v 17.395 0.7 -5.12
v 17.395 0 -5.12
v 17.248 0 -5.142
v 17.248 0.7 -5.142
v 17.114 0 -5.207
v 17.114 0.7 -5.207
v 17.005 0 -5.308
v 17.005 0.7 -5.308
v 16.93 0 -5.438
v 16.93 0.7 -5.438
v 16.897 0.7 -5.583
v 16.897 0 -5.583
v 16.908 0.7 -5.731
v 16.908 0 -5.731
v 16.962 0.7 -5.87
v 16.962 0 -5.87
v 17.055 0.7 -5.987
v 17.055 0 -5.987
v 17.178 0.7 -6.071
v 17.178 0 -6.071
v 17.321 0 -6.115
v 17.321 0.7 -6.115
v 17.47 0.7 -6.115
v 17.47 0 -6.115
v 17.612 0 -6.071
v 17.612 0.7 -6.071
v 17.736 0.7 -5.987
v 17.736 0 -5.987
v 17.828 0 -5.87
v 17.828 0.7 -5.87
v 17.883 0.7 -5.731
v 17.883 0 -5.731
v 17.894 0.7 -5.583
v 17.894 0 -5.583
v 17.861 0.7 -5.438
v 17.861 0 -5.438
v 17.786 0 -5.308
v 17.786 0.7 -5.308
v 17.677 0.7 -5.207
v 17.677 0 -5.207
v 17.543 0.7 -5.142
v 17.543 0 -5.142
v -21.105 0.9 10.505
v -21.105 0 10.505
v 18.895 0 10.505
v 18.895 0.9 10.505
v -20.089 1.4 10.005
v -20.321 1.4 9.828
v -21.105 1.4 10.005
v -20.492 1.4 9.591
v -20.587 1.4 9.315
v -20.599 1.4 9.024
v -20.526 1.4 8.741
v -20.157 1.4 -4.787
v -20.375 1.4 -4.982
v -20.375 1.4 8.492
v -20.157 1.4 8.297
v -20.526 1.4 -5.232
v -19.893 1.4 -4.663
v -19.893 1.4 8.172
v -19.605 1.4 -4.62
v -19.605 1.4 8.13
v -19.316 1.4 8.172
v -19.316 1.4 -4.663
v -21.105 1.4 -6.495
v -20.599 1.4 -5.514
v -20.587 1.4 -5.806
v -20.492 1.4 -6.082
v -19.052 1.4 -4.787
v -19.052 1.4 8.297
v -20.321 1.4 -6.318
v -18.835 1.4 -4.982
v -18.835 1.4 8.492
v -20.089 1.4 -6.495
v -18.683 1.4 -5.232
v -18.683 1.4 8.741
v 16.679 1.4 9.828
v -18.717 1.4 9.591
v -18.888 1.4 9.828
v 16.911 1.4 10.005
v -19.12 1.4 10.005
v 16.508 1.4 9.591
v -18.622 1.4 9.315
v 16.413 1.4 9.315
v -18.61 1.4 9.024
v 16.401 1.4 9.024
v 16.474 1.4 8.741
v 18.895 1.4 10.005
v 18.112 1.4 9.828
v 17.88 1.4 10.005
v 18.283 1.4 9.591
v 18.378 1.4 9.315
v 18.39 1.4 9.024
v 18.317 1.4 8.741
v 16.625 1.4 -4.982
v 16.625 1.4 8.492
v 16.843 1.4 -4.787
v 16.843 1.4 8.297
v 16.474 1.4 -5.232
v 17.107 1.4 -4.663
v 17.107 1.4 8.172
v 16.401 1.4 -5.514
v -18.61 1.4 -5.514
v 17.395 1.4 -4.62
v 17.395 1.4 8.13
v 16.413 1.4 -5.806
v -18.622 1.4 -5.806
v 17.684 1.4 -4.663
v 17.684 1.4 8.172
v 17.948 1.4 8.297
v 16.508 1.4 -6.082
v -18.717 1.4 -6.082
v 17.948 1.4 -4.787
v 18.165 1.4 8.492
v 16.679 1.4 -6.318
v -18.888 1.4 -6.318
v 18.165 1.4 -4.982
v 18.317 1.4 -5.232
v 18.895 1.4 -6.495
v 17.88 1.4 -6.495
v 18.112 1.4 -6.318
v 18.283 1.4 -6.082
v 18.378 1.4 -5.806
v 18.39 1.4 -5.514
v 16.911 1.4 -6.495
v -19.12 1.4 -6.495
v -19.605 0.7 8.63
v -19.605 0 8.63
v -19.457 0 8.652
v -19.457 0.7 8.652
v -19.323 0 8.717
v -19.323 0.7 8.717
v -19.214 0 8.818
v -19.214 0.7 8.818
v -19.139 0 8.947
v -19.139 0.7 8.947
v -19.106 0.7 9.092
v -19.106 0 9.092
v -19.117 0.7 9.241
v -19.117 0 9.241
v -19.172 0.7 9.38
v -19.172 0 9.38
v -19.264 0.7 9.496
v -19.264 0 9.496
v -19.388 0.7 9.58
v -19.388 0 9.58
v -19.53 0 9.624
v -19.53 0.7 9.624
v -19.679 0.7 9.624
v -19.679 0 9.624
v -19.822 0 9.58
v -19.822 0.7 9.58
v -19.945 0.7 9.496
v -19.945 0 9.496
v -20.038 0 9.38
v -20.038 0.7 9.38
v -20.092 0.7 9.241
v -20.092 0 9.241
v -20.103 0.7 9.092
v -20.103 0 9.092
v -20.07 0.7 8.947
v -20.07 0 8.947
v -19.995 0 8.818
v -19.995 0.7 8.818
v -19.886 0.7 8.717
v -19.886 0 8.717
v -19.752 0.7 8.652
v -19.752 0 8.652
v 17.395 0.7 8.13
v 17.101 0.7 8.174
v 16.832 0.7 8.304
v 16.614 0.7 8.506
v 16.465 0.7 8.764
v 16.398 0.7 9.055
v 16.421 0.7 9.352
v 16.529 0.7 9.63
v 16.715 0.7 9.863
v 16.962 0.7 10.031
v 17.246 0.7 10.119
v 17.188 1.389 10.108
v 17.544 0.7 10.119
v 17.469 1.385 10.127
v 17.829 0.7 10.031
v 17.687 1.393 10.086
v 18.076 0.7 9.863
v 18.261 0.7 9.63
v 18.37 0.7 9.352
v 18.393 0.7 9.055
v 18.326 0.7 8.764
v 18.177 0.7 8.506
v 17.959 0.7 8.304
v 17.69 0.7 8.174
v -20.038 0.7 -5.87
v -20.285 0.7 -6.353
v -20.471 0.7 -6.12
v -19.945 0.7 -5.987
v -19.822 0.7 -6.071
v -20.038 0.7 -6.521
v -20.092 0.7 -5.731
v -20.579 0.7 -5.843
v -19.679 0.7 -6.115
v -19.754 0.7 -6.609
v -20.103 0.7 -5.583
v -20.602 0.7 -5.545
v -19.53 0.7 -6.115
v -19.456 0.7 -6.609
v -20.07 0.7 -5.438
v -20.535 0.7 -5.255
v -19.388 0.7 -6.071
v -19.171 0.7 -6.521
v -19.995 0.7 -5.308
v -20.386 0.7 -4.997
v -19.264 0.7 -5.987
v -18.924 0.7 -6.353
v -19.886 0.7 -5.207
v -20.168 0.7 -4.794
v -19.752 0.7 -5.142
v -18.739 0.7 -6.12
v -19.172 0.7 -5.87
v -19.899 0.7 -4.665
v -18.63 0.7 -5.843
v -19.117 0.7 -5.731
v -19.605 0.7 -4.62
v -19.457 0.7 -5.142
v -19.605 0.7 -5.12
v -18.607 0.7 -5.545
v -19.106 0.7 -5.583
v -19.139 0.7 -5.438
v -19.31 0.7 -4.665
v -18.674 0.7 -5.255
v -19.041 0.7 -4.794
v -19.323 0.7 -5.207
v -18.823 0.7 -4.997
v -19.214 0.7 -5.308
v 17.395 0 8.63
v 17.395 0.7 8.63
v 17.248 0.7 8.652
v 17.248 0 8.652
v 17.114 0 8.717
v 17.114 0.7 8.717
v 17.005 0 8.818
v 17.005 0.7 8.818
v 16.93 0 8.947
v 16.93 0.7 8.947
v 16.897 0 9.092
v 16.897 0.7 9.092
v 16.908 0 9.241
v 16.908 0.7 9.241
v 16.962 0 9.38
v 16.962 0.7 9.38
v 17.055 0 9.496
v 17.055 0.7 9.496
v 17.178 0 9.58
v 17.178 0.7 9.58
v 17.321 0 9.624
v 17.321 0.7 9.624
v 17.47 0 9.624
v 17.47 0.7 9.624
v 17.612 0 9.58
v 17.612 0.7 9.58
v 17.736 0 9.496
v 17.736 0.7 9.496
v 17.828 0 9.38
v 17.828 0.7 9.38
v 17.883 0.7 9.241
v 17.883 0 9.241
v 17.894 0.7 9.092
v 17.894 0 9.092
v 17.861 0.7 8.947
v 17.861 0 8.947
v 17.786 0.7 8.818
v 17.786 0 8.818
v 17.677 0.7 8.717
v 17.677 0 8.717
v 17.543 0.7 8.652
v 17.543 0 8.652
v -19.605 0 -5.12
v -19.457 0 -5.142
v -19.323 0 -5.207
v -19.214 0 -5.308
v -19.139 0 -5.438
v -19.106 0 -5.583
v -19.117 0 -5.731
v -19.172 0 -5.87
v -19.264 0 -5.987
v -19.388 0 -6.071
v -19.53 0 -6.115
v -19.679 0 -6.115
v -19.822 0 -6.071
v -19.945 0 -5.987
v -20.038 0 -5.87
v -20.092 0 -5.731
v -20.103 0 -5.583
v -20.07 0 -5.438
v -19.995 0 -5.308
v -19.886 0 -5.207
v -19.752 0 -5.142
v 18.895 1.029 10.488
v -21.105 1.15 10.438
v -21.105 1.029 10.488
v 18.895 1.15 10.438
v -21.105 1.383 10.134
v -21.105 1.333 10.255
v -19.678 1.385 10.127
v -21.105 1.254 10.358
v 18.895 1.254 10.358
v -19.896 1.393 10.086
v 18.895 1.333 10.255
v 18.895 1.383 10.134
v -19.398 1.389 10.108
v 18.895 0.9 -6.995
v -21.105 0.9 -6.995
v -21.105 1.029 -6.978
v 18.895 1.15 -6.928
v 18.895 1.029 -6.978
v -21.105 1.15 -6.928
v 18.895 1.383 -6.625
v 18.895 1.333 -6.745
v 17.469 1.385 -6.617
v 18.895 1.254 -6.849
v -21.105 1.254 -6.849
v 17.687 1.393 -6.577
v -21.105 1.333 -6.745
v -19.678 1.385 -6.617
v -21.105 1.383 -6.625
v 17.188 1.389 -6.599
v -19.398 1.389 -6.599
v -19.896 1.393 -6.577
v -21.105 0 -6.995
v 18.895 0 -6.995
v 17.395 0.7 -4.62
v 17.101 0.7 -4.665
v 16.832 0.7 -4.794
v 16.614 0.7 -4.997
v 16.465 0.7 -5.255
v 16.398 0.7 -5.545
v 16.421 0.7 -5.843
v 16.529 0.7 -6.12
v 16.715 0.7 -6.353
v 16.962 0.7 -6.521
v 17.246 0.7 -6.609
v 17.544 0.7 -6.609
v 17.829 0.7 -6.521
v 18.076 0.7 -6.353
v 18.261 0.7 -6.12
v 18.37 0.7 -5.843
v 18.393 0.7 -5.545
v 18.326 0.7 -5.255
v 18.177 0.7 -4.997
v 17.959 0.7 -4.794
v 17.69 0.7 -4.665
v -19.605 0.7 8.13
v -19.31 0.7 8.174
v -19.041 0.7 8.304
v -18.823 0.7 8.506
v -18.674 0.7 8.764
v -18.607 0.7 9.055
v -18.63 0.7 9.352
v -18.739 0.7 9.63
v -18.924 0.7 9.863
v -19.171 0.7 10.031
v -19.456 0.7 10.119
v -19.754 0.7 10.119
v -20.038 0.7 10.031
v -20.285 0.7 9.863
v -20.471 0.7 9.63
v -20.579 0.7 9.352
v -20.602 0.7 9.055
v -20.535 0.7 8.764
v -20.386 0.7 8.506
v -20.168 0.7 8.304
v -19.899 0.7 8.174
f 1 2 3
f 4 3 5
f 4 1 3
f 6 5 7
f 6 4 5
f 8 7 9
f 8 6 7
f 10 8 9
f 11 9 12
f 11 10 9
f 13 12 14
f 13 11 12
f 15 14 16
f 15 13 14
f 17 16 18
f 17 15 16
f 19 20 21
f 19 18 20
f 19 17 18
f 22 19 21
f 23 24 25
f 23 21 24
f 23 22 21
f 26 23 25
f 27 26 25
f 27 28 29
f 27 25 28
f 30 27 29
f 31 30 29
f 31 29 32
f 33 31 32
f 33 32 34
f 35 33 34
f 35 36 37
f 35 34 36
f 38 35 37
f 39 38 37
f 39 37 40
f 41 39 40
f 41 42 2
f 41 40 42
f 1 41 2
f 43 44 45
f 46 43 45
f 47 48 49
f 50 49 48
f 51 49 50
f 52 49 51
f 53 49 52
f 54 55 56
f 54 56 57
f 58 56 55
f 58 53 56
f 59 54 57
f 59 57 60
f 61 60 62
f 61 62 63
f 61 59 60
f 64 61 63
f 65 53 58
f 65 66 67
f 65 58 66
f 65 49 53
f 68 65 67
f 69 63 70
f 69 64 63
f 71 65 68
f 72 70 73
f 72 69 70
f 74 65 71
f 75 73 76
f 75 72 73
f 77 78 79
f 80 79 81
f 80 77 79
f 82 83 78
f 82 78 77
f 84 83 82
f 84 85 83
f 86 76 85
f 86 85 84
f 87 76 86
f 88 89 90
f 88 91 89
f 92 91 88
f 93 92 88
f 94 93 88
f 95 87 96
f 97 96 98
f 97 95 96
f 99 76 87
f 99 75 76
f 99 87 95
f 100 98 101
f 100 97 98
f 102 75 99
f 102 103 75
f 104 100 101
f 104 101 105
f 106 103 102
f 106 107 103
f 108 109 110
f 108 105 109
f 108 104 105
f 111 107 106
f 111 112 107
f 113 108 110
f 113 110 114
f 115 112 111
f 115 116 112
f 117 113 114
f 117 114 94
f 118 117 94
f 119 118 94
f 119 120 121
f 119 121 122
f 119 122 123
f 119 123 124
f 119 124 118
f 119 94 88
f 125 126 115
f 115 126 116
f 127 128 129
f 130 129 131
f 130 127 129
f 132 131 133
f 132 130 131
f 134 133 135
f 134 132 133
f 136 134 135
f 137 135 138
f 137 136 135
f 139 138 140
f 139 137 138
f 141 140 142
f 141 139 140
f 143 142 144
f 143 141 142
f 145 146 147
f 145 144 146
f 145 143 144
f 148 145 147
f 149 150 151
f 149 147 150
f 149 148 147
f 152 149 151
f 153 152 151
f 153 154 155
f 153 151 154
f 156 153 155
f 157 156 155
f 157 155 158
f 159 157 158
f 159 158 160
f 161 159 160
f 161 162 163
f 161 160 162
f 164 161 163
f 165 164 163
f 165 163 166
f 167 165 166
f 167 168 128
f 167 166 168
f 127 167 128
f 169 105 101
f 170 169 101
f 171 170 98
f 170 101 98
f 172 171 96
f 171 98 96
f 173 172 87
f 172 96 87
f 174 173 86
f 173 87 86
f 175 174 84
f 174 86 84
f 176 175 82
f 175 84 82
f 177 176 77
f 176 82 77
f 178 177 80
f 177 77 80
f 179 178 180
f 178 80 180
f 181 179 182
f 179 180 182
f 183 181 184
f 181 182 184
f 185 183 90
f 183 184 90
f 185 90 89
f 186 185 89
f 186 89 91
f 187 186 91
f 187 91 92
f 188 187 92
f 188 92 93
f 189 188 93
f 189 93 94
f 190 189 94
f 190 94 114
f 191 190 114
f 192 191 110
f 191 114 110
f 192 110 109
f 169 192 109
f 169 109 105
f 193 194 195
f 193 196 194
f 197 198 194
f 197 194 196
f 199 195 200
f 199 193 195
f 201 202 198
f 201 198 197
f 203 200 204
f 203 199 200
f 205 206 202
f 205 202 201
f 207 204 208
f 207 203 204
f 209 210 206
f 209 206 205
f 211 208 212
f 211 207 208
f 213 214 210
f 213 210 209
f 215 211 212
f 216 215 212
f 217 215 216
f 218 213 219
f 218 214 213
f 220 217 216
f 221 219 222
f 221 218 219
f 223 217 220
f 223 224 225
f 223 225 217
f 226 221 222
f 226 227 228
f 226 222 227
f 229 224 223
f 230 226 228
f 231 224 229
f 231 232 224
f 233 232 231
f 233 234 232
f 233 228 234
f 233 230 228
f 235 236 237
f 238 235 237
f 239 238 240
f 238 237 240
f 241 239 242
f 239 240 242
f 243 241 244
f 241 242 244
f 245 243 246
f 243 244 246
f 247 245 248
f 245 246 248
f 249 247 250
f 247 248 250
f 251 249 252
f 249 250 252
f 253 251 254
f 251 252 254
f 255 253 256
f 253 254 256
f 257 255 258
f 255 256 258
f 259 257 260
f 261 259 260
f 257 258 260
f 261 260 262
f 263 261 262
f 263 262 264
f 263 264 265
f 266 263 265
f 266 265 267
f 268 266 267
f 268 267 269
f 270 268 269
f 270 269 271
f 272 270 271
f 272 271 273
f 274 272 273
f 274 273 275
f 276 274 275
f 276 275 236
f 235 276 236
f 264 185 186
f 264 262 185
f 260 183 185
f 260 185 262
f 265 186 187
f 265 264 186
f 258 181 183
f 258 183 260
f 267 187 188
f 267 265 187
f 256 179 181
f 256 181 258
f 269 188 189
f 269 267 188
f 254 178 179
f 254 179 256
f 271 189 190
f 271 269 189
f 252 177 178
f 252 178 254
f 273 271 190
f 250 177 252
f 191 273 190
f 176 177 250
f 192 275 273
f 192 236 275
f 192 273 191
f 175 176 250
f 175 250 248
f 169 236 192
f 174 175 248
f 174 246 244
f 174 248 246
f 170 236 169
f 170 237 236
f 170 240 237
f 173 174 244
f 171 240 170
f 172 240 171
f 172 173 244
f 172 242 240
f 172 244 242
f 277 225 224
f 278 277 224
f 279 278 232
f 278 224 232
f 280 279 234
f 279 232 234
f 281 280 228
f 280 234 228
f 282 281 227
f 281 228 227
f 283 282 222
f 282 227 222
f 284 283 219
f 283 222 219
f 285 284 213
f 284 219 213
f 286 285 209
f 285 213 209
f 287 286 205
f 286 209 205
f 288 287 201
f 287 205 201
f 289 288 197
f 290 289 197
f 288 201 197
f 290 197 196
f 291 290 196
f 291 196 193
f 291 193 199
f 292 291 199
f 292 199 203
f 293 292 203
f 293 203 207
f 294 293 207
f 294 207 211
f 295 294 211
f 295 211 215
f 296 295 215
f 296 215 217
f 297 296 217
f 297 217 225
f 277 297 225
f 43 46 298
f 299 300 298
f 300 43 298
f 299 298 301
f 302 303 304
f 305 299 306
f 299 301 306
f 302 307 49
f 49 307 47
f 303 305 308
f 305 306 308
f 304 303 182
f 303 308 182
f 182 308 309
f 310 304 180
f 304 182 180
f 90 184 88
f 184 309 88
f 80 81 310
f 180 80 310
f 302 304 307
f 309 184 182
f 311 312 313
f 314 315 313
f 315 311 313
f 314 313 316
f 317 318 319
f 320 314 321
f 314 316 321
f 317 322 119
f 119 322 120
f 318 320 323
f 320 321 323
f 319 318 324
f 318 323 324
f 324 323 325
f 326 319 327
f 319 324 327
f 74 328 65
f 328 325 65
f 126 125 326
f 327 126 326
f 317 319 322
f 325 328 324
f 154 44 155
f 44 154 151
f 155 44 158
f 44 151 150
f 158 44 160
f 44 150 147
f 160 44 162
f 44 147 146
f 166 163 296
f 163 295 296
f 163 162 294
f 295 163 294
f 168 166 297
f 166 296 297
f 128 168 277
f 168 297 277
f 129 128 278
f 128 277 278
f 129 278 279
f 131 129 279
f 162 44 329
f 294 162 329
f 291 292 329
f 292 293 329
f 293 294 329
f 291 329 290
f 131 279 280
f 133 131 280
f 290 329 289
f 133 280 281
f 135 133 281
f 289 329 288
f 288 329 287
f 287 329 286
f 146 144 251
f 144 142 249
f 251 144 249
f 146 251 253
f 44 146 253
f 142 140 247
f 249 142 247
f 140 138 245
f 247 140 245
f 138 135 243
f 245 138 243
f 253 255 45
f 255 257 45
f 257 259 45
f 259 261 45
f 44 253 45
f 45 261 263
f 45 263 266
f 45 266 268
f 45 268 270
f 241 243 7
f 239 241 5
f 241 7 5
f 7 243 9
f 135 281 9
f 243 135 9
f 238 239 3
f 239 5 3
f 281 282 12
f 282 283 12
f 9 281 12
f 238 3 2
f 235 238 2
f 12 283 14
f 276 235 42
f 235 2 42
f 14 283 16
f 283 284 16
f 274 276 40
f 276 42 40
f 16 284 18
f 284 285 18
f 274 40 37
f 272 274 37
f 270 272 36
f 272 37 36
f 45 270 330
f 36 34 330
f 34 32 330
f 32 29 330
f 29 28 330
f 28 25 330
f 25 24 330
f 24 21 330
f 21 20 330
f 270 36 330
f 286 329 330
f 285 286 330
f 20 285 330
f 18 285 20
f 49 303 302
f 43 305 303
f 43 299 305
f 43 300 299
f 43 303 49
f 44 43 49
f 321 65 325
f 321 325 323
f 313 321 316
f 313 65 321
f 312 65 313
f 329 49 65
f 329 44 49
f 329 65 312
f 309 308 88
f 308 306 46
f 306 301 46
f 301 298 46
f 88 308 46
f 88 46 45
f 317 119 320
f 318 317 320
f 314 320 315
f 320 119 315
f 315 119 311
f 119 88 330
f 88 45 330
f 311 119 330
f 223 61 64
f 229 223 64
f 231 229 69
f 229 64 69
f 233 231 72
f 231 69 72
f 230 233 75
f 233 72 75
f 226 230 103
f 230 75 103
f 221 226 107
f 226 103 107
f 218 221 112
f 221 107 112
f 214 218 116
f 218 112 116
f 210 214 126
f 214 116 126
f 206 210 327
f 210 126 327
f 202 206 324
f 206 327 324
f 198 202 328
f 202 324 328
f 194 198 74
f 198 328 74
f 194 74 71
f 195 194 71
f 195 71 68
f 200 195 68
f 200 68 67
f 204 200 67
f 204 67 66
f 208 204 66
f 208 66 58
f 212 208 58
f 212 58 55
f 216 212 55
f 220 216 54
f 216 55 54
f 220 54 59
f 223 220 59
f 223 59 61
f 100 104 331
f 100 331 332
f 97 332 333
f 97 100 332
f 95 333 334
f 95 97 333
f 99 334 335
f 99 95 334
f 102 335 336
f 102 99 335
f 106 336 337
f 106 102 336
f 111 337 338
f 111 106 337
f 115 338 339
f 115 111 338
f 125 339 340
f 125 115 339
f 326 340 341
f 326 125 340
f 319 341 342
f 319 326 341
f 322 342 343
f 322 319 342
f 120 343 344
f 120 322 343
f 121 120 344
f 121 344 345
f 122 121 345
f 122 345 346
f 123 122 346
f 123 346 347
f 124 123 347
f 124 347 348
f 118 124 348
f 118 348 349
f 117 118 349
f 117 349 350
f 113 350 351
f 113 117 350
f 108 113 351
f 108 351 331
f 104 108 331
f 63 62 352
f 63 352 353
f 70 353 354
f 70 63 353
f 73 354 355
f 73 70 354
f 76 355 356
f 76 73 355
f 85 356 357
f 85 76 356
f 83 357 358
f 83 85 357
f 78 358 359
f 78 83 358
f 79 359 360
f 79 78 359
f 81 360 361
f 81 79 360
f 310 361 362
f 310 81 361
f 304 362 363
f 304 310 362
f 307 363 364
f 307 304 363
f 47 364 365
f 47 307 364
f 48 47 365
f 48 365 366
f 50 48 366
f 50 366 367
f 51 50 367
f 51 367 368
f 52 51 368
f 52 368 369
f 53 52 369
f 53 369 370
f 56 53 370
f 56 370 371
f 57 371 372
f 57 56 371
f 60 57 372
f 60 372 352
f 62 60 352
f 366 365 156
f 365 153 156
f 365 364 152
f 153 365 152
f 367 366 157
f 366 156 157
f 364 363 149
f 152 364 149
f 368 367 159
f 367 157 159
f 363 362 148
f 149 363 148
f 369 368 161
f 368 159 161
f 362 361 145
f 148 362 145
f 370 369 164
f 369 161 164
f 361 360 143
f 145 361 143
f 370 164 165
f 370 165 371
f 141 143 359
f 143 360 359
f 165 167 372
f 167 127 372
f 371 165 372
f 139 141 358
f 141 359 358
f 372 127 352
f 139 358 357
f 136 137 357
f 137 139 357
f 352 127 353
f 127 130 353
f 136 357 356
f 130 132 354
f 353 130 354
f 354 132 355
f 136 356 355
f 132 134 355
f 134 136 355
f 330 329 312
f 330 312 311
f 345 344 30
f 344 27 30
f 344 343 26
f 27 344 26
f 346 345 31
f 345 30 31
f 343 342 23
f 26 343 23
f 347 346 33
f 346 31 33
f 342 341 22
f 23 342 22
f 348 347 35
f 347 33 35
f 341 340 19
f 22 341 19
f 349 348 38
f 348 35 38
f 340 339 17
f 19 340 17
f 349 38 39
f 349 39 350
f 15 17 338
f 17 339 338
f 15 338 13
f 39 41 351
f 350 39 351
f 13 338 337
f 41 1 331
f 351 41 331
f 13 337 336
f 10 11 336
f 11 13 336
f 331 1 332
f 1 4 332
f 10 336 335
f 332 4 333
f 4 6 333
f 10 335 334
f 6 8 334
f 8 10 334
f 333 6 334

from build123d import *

# Parameters (mm, degrees)
SKETCH_1_W               = 40
SKETCH_1_H               = 17.5
EXTRUDE_1_DEPTH          = 1.4
SKETCH_3_R               = 1
CUT_EXTRUDE_2_DEPTH      = 0.7
SKETCH_4_R               = 0.5
CUT_EXTRUDE_3_DEPTH      = 1.5
MIRROR_2_COPY_1_SKETCH_R = 1
MIRROR_2_COPY_1_DEPTH    = 0.7
MIRROR_2_COPY_2_SKETCH_R = 0.5
MIRROR_2_COPY_2_DEPTH    = 1.5
FILLET_2_R               = 0.5
FILLET_3_R               = 0.5


with BuildPart() as part:
    # 草图1 → 凸台-拉伸1 (new body)
    with BuildSketch(Plane(origin=(0, 0, 0), x_dir=(1, 0, 0), z_dir=(0, 1, 0))):
        with Locations((-1.104564914, -1.754819984)):
            Rectangle(SKETCH_1_W, SKETCH_1_H)
    extrude(amount=EXTRUDE_1_DEPTH)

    # 草图3 → 切除-拉伸2 (cut)
    with BuildSketch(Plane(origin=(0, 1.4, 0), x_dir=(1, 0, 0), z_dir=(0, 1, 0))):
        with Locations(Location((-19.604564914, 5.620180016, 0), (0, 0, 270))):
            Circle(SKETCH_3_R)
    cut_extrude_2 = extrude(amount=-CUT_EXTRUDE_2_DEPTH, mode=Mode.SUBTRACT)

    # 草图4 → 切除-拉伸3 (cut)
    with BuildSketch(Plane(origin=(0, 0.7, 0), x_dir=(1, 0, 0), z_dir=(0, 1, 0))):
        with Locations(Location((-19.604564914, 5.620180016, 0), (0, 0, 270))):
            Circle(SKETCH_4_R)
    cut_extrude_3 = extrude(amount=-CUT_EXTRUDE_3_DEPTH, mode=Mode.SUBTRACT)

    # 镜向1: 切除-拉伸2, 切除-拉伸3 across plane
    add(cut_extrude_2.mirror(Plane.XY.offset(1.754819984)), mode=Mode.SUBTRACT)
    add(cut_extrude_3.mirror(Plane.XY.offset(1.754819984)), mode=Mode.SUBTRACT)

    # 镜向2: 切除-拉伸2, 切除-拉伸3 across plane
    add(cut_extrude_2.mirror(Plane(origin=(-1.104564914, 0, 0), x_dir=(0, 0, 1), z_dir=(1, 0, 0))), mode=Mode.SUBTRACT)
    add(cut_extrude_3.mirror(Plane(origin=(-1.104564914, 0, 0), x_dir=(0, 0, 1), z_dir=(1, 0, 0))), mode=Mode.SUBTRACT)

    # 镜向2 copy 1 sketch → 镜向2 copy 1 (cut)
    with BuildSketch(Plane(origin=(-2.209129827, 1.4, 3.509639969), x_dir=(-1, 0, 0), z_dir=(0, 1, 0))):
        with Locations(Location((-19.604564914, 5.620180016, 0), (0, 0, 270))):
            Circle(MIRROR_2_COPY_1_SKETCH_R)
    extrude(amount=-MIRROR_2_COPY_1_DEPTH, mode=Mode.SUBTRACT)

    # 镜向2 copy 2 sketch → 镜向2 copy 2 (cut)
    with BuildSketch(Plane(origin=(-2.209129827, 0.7, 3.509639969), x_dir=(-1, 0, 0), z_dir=(0, 1, 0))):
        with Locations(Location((-19.604564914, 5.620180016, 0), (0, 0, 270))):
            Circle(MIRROR_2_COPY_2_SKETCH_R)
    extrude(amount=-MIRROR_2_COPY_2_DEPTH, mode=Mode.SUBTRACT)

    # 圆角2
    # the kernel refuses this fillet: 0.5 mm, written as the material it takes off along each edge
    with BuildSketch(Plane(origin=(-22.354564914, 1.4, -6.995180016), x_dir=(0, -1, 0), z_dir=(1, 0, 0))) as fillet_2_piece_1:
        with BuildLine():
            CenterArc((FILLET_2_R, -FILLET_2_R), FILLET_2_R, 90, 90)
            Line((0, -FILLET_2_R), (0, 0))
            Line((0, 0), (FILLET_2_R, 0))
        make_face()
    extrude(amount=42.5, mode=Mode.SUBTRACT)

    # 圆角3
    # the kernel refuses this fillet: 0.5 mm, written as the material it takes off along each edge
    with BuildSketch(Plane(origin=(20.145435086, 1.4, 10.504819984), x_dir=(0, -1, 0), z_dir=(-1, 0, 0))) as fillet_3_piece_1:
        with BuildLine():
            CenterArc((FILLET_3_R, -FILLET_3_R), FILLET_3_R, 90, 90)
            Line((0, -FILLET_3_R), (0, 0))
            Line((0, 0), (FILLET_3_R, 0))
        make_face()
    extrude(amount=42.5, mode=Mode.SUBTRACT)


solid = part.part
